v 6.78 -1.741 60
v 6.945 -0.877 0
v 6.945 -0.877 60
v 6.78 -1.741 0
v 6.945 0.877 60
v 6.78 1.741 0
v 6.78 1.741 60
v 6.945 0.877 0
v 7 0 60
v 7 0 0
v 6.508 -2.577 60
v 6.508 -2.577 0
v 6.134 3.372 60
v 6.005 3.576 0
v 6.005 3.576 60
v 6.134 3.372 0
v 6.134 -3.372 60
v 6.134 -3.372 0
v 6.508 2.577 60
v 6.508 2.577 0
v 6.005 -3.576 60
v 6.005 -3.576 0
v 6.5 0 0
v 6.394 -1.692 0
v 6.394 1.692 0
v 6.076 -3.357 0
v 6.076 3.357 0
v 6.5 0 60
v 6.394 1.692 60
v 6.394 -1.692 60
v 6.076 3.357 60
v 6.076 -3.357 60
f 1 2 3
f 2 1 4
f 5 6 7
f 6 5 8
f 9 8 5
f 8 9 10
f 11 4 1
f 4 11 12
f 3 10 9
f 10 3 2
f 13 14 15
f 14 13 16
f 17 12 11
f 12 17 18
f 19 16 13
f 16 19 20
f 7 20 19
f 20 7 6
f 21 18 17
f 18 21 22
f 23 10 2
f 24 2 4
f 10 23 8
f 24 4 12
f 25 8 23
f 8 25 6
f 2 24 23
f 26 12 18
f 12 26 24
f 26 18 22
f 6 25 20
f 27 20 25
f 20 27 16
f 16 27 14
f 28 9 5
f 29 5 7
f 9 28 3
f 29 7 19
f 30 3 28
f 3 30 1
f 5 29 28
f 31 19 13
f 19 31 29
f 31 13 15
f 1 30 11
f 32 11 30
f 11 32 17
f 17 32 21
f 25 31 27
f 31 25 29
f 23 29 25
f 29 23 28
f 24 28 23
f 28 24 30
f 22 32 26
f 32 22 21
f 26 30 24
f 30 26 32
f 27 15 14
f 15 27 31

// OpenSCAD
$fn = 50;


difference() {
	union() {
		cylinder(h = 60, r = 7.0000000000);
		translate(v = [-10.0000000000, 0, 0]) {
			cylinder(h = 60, r = 7.0000000000);
		}
	}
	union() {
		cylinder(h = 60, r = 3.2500000000);
		cylinder(h = 60, r = 1.8000000000);
		cylinder(h = 60, r = 1.8000000000);
		cylinder(h = 60, r = 1.8000000000);
		translate(v = [-14.5000000000, 0, 0]) {
			hull() {
				translate(v = [-3.7500000000, 0.0000000000, 0]) {
					cylinder(h = 60, r = 10.5000000000);
				}
				translate(v = [3.7500000000, 0.0000000000, 0]) {
					cylinder(h = 60, r = 10.5000000000);
				}
				translate(v = [-3.7500000000, -0.0000000000, 0]) {
					cylinder(h = 60, r = 10.5000000000);
				}
				translate(v = [3.7500000000, -0.0000000000, 0]) {
					cylinder(h = 60, r = 10.5000000000);
				}
			}
		}
		translate(v = [-7.0000000000, 0, 0.0000000000]) {
			cylinder(h = 60, r = 13.5000000000);
		}
	}
}
